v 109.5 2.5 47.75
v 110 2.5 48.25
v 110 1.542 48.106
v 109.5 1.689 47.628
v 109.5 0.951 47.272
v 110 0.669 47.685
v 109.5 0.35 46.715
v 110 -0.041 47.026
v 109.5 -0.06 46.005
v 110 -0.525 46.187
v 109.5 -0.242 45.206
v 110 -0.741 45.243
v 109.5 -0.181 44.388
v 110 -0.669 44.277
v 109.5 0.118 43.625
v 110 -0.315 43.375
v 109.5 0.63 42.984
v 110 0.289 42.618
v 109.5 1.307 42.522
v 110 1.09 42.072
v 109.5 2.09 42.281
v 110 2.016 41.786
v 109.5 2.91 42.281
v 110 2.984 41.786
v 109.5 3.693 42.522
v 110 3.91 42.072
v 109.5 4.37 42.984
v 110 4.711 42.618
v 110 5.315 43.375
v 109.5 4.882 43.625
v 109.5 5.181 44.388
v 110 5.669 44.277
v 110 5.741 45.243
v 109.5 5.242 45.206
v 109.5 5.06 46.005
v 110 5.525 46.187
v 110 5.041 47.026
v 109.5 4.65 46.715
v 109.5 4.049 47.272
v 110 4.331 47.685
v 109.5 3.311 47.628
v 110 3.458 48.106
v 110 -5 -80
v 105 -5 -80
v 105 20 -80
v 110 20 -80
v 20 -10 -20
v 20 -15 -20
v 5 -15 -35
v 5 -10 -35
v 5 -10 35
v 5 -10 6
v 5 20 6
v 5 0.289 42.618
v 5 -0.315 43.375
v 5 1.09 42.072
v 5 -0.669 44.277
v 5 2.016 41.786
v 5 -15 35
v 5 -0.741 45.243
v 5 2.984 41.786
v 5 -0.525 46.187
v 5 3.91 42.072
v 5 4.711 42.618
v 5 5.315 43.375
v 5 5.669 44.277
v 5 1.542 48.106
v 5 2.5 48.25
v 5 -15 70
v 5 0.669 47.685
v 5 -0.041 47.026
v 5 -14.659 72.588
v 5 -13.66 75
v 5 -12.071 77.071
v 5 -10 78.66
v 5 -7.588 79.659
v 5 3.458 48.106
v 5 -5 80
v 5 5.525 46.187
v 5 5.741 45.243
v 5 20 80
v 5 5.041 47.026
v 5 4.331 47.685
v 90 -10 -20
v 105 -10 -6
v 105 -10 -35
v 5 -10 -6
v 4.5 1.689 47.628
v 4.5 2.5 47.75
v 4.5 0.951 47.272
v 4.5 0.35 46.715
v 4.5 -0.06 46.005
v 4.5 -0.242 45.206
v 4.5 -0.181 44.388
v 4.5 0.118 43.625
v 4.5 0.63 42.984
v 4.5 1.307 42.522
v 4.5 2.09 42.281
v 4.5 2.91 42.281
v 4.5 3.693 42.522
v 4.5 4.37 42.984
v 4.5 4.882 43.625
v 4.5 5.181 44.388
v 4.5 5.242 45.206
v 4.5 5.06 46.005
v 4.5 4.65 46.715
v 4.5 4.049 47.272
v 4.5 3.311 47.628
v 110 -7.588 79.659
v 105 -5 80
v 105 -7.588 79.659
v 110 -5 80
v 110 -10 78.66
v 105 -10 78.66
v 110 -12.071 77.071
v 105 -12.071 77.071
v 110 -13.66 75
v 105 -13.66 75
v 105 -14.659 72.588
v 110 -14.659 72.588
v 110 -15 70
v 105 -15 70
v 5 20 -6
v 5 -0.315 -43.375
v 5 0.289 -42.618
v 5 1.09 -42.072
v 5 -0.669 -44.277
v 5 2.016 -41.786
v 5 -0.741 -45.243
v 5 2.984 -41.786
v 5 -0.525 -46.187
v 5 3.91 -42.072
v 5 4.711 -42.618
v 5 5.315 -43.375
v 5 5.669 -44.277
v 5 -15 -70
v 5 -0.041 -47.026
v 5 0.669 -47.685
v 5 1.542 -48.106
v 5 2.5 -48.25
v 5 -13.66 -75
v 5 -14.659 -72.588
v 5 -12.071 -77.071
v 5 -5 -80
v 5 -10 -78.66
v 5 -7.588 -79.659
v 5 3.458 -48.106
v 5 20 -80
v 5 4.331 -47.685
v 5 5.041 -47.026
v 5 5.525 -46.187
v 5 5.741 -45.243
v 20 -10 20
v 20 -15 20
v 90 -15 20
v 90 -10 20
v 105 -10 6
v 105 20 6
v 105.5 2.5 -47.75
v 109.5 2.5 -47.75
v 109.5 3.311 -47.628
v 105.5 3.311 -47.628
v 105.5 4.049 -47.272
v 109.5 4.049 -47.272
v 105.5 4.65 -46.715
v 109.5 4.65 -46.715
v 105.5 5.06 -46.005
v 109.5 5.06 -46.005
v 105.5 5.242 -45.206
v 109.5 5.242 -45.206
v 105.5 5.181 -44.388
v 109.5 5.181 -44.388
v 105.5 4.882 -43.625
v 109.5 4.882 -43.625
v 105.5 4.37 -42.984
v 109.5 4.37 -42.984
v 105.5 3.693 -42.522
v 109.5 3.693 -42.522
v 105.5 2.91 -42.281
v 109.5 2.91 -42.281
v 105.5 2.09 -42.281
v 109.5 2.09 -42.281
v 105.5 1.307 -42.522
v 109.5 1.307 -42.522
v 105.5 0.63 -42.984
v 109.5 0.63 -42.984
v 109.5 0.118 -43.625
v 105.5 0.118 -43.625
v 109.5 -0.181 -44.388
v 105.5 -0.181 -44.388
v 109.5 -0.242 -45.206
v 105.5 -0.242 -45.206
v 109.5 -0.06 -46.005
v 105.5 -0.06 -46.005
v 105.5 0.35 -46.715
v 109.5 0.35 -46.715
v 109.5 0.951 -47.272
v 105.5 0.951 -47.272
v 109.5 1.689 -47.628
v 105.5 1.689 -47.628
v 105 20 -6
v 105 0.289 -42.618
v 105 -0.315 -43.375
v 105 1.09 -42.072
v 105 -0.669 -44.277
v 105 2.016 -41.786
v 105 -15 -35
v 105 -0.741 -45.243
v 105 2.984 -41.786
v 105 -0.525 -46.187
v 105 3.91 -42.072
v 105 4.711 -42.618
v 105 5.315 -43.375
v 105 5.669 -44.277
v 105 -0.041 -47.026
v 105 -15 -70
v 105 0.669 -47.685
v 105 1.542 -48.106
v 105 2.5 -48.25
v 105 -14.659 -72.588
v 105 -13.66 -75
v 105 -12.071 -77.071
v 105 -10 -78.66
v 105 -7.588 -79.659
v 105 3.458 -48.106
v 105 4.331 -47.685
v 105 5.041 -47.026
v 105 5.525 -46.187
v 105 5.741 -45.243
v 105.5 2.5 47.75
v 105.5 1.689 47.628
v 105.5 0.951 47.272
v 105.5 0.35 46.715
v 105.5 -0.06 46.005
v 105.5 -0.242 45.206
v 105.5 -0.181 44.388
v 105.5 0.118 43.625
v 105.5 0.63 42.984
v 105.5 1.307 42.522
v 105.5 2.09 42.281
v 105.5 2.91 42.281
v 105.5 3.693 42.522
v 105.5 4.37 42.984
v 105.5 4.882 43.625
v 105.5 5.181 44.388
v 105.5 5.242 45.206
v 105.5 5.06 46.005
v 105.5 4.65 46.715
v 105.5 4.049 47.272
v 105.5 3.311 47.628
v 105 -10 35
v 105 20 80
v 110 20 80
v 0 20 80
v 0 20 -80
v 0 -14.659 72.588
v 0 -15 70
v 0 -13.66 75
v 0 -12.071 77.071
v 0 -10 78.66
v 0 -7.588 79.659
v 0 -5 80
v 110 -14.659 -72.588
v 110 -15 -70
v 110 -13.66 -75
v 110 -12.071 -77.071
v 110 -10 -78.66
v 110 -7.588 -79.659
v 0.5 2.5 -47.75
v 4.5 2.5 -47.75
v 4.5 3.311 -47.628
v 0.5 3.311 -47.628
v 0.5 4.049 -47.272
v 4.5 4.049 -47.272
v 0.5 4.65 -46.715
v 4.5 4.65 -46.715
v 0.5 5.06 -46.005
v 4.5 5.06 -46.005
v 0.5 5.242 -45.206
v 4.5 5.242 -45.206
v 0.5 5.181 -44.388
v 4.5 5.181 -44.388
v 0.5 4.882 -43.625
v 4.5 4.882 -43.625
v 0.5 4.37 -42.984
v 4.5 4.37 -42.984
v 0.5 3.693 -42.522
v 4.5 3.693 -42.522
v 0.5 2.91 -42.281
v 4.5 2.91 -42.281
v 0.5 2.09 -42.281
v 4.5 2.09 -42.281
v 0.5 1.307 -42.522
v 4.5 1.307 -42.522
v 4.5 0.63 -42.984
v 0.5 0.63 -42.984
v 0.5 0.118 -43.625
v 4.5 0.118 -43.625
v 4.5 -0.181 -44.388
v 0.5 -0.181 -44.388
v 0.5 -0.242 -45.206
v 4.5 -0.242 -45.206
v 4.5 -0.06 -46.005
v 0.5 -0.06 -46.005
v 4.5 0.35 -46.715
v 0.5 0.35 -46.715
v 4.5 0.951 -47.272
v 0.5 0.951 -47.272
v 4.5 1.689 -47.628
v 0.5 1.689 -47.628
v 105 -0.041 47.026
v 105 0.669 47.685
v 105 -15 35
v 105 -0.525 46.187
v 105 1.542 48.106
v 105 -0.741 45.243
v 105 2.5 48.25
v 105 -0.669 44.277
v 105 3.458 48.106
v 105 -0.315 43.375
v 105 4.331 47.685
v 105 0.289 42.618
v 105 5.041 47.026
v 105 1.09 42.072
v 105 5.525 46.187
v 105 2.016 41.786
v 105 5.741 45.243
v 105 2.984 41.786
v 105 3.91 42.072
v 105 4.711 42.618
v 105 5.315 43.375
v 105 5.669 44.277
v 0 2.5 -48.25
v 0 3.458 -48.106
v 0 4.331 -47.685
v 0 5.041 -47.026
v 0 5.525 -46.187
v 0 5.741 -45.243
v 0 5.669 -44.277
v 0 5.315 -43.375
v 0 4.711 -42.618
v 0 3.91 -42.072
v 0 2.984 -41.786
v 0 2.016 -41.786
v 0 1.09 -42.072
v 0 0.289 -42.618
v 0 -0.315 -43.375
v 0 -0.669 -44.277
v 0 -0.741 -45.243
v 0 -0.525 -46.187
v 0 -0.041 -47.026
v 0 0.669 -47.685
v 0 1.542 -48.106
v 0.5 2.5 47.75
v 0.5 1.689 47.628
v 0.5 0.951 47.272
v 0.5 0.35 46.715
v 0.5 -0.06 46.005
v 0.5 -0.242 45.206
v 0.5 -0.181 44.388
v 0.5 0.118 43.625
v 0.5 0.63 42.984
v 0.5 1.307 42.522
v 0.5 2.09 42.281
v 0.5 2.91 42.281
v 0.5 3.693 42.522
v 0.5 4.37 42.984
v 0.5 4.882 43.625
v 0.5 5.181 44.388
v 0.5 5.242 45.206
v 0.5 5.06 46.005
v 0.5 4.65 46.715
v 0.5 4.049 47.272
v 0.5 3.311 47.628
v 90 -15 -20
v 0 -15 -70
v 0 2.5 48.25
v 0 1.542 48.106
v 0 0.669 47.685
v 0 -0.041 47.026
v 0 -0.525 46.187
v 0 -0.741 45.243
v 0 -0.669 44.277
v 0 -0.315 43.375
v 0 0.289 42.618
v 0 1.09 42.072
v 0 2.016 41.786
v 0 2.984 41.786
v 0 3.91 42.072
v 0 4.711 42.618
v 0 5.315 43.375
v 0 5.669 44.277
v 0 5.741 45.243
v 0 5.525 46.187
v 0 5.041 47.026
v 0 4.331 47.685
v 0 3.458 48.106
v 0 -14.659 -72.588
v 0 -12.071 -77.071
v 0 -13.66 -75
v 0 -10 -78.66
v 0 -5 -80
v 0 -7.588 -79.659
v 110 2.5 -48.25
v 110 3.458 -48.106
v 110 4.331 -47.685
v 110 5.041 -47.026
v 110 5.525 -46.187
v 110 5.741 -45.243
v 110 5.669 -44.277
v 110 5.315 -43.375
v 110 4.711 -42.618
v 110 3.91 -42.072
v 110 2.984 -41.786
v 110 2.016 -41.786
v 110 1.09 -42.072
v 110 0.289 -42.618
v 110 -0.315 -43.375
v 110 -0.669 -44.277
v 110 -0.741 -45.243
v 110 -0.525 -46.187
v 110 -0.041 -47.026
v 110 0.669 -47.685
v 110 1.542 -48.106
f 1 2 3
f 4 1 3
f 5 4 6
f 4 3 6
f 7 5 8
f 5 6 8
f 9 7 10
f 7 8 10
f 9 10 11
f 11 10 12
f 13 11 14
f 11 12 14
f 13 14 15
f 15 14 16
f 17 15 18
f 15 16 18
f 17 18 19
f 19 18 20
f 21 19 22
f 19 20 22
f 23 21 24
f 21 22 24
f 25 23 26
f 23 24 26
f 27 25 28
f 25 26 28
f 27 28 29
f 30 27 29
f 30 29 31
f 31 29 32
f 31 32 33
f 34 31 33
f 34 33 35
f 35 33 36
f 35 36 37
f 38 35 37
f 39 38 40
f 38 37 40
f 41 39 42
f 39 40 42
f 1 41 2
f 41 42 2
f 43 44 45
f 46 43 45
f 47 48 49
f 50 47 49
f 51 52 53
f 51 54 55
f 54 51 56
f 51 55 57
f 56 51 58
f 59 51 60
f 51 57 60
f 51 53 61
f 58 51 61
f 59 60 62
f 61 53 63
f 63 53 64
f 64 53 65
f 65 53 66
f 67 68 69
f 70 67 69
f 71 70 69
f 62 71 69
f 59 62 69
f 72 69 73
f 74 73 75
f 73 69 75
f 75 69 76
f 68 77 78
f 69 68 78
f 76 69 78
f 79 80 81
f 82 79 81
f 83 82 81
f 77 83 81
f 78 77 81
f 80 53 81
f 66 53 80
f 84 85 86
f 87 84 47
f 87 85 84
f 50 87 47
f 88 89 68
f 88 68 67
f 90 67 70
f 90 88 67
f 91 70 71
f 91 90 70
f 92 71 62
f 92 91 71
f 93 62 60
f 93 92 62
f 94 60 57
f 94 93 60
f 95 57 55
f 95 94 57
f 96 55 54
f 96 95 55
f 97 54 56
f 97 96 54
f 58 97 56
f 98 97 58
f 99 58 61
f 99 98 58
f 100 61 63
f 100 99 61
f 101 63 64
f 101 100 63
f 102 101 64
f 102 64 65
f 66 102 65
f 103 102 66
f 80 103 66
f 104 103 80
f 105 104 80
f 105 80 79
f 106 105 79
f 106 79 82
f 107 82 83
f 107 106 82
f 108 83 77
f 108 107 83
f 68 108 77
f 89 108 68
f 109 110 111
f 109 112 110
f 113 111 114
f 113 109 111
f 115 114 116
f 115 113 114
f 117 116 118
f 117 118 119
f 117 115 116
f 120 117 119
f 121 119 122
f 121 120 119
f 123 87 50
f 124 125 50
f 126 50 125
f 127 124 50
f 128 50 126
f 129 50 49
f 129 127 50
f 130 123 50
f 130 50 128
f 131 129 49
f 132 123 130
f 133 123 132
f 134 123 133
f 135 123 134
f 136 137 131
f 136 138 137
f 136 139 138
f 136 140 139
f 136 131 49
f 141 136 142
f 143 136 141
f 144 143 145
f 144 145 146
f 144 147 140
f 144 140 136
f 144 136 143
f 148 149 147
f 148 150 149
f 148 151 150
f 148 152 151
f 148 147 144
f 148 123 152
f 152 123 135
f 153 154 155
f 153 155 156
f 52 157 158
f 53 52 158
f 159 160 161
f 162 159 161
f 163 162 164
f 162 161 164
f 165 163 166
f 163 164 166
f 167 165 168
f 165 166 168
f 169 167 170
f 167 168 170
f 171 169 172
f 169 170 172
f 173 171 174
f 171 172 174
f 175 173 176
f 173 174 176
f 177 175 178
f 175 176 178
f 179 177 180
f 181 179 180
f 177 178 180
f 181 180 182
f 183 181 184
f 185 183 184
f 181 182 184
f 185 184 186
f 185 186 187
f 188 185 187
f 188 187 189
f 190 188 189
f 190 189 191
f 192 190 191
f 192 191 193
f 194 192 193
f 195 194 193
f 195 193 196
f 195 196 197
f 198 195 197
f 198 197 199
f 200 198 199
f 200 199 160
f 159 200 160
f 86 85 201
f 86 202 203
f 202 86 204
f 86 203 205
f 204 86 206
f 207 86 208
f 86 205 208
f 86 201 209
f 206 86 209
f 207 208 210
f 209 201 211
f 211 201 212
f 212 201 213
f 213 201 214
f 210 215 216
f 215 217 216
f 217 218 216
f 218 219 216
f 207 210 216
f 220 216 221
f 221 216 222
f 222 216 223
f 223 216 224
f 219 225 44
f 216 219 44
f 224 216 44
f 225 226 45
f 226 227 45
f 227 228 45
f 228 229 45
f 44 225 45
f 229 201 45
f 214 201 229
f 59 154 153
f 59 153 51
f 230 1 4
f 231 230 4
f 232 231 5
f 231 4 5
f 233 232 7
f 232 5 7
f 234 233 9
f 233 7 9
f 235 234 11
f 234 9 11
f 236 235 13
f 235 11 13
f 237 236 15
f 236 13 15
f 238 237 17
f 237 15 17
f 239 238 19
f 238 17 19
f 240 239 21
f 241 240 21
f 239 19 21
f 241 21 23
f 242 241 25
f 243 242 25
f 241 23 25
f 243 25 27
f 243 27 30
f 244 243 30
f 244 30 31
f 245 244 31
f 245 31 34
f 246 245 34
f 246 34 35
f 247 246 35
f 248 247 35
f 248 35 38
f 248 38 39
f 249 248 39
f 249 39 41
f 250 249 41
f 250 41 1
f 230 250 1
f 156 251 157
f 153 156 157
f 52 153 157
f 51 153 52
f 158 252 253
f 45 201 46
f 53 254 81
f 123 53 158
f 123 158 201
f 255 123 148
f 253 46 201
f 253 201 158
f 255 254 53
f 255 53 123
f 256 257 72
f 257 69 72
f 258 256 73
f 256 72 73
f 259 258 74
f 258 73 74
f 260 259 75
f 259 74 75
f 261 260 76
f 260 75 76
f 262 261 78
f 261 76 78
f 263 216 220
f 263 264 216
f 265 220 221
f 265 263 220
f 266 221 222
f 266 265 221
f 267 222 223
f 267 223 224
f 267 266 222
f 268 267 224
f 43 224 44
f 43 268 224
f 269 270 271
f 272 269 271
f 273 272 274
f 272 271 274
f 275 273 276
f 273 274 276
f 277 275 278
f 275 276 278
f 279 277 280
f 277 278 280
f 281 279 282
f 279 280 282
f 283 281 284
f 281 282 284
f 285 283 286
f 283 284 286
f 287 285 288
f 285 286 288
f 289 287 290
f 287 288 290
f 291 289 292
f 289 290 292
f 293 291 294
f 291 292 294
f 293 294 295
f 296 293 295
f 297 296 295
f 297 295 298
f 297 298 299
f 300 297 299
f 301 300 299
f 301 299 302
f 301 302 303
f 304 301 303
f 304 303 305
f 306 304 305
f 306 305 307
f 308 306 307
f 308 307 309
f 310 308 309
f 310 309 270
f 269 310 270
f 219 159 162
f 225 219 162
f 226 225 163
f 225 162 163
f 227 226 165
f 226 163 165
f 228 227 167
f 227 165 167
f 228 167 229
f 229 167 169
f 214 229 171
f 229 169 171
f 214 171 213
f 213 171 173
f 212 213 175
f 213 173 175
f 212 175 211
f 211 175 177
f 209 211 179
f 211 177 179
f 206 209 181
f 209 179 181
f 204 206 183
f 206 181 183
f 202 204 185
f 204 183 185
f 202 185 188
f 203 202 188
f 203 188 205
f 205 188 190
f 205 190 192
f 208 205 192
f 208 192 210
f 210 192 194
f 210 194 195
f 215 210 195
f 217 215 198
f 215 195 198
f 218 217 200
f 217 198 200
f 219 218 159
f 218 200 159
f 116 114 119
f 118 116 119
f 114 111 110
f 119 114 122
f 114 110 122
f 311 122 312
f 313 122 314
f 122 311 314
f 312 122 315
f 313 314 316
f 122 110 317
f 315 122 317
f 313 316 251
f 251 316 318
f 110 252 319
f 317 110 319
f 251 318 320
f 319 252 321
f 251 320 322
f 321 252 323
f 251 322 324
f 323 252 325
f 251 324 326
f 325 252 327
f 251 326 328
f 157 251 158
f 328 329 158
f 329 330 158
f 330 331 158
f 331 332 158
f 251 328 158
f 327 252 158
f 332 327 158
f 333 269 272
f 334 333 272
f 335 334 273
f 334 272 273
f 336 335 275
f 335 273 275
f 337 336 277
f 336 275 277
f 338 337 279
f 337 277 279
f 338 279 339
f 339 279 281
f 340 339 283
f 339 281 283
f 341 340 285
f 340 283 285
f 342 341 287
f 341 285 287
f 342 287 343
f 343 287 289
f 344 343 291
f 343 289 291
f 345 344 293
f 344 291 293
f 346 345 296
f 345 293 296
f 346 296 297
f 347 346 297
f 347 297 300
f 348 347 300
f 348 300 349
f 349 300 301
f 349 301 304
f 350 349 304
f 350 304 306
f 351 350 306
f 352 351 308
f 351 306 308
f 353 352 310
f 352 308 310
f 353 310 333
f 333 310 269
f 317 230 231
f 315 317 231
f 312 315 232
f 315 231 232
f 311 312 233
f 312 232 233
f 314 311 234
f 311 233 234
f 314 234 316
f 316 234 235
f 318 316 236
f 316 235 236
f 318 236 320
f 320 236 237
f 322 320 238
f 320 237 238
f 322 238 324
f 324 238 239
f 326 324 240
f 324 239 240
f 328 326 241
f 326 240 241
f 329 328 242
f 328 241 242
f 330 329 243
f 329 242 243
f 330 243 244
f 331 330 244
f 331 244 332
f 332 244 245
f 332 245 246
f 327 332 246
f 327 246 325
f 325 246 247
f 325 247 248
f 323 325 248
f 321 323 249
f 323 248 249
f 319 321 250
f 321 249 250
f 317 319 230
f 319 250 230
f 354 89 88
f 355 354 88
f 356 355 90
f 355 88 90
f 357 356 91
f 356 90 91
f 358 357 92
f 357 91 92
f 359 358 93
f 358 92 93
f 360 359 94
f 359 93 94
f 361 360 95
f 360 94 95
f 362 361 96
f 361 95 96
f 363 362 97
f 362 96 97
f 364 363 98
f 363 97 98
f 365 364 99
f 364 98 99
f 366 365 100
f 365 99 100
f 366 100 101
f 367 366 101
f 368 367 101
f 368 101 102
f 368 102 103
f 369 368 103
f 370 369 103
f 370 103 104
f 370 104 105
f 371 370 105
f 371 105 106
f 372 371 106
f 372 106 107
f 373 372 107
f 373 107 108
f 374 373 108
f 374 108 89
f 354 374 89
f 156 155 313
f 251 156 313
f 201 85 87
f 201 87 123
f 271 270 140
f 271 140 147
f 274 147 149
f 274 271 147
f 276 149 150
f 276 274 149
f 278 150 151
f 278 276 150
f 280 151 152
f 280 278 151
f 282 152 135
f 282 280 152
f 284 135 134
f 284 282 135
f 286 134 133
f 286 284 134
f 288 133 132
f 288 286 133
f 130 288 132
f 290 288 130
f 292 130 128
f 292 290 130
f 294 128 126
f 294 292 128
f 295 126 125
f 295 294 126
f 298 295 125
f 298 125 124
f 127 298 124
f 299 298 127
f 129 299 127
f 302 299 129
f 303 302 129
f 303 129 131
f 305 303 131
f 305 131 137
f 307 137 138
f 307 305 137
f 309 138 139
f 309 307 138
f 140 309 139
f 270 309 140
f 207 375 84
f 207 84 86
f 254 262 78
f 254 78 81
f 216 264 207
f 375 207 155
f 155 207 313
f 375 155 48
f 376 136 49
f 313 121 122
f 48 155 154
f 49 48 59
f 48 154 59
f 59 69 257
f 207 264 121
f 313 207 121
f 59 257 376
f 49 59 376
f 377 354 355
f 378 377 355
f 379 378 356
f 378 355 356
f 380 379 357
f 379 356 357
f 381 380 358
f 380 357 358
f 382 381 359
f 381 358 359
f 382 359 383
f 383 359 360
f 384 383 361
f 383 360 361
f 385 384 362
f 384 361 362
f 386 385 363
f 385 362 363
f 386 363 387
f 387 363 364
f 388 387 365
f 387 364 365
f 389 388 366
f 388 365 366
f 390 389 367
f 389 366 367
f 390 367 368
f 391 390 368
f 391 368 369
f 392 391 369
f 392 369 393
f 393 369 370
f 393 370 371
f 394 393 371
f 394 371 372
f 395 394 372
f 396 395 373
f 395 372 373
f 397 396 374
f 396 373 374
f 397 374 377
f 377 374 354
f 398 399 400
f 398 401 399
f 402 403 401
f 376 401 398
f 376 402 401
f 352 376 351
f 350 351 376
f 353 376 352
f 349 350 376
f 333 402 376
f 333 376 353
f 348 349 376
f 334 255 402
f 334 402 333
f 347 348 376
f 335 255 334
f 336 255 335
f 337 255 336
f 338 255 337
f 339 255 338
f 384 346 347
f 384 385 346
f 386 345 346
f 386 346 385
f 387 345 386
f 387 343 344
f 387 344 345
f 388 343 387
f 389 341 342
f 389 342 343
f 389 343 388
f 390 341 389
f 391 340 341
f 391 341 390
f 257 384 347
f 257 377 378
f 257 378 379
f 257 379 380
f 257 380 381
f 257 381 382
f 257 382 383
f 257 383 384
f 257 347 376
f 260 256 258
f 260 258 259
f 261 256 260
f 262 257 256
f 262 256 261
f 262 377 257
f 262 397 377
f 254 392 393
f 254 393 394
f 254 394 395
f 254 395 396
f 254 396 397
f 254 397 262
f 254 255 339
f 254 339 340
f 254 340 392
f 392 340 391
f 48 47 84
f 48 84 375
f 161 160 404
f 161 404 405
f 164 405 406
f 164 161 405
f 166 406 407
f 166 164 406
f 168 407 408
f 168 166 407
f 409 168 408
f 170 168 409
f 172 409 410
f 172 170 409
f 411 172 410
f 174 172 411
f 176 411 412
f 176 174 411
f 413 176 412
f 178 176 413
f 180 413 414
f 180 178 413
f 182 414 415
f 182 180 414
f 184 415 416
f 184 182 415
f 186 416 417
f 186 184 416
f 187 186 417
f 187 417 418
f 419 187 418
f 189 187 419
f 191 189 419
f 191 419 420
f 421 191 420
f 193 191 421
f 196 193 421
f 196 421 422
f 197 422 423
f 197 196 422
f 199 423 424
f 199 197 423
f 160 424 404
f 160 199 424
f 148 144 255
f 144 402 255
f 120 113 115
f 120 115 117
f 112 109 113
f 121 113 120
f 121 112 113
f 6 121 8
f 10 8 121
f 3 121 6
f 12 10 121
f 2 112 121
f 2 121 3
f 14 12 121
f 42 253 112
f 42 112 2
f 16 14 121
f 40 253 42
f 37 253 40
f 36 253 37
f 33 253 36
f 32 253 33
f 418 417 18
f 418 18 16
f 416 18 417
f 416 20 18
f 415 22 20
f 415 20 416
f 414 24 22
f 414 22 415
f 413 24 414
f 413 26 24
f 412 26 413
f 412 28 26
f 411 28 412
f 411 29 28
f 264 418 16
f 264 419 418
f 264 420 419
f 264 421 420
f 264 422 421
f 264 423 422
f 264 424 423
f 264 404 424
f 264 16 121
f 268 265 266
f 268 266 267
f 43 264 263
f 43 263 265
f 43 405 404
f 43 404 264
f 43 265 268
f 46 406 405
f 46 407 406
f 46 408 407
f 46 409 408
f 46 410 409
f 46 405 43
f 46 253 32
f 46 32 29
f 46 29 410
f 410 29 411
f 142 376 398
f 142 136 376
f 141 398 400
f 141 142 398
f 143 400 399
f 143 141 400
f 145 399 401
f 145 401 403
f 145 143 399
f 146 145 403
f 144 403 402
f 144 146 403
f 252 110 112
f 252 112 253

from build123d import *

# Parameters (mm, degrees)
SKETCH_1_W          = 160
SKETCH_1_H          = 20
EXTRUDE_1_DEPTH     = 5
EXTRUDE_3_DEPTH     = 100
SKETCH_5_W          = 12
SKETCH_5_H          = 15
EXTRUDE_4_DEPTH     = 105
SKETCH_6_W          = 74
SKETCH_6_H          = 15
EXTRUDE_5_DEPTH     = 5
SKETCH_7_W          = 160
SKETCH_7_H          = 35
EXTRUDE_6_DEPTH     = 5
EXTRUDE_7_DEPTH     = 5
SKETCH_9_R          = 2.75
CUT_EXTRUDE_1_DEPTH = 138.477270849
CHAMFER_1_SIZE      = 0.5
FILLET_1_R          = 10


with BuildPart() as part:
    # 草图1 → 凸台-拉伸1 (new body)
    with BuildSketch(Plane(origin=(0, 0, 0), x_dir=(0, 0, -1), z_dir=(1, 0, 0))):
        with Locations((0, -5)):
            Rectangle(SKETCH_1_W, SKETCH_1_H)
    extrude(amount=EXTRUDE_1_DEPTH)

    # 草图3 → 凸台-拉伸3 (add)
    with BuildSketch(Plane(origin=(5, 0, 0), x_dir=(0, 0, -1), z_dir=(1, 0, 0))):
        Polygon((-6, 5), (6, 5), (6, -10), (20, -10), (20, -15), (-20, -15), (-20, -10), (-6, -10), align=None)
    extrude(amount=EXTRUDE_3_DEPTH)

    # 草图5 → 凸台-拉伸4 (add)
    with BuildSketch(Plane.ZY):
        with Locations((0, 12.5)):
            Rectangle(SKETCH_5_W, SKETCH_5_H)
    extrude(amount=-EXTRUDE_4_DEPTH)

    # 草图6 → 凸台-拉伸5 (add)
    with BuildSketch(Plane.ZY):
        with Locations((43, 12.5)):
            Rectangle(SKETCH_6_W, SKETCH_6_H)
        with Locations((-43, 12.5)):
            Rectangle(SKETCH_6_W, SKETCH_6_H)
    extrude(amount=-EXTRUDE_5_DEPTH)

    # 草图7 → 凸台-拉伸6 (add)
    with BuildSketch(Plane(origin=(105, 0, 0), x_dir=(0, 0, -1), z_dir=(1, 0, 0))):
        with Locations((0, 2.5)):
            Rectangle(SKETCH_7_W, SKETCH_7_H)
    extrude(amount=EXTRUDE_6_DEPTH)

    # 草图8 → 凸台-拉伸7 (add)
    with BuildSketch(Plane.XZ.offset(15)):
        Polygon((90, 20), (105, 35), (105, 20), align=None)
        Polygon((105, -20), (90, -20), (105, -35), align=None)
        Polygon((5, 20), (20, 20), (5, 35), align=None)
        Polygon((20, -20), (5, -35), (5, -20), align=None)
    extrude(amount=-EXTRUDE_7_DEPTH)

    # 草图9 → 切除-拉伸1 (cut, through all)
    with BuildSketch(Plane(origin=(110, 0, 0), x_dir=(0, 0, -1), z_dir=(1, 0, 0))):
        with Locations((45, 2.5)):
            Circle(SKETCH_9_R)
        with Locations(Location((-45, 2.5, 0), (0, 0, 180))):
            Circle(SKETCH_9_R)
    extrude(amount=-CUT_EXTRUDE_1_DEPTH, mode=Mode.SUBTRACT)

    # 倒角1
    chamfer_1_edges = [part.edges().sort_by_distance(p)[0] for p in [
        (105, 2.5, -42.25),
        (5, 2.5, -42.25),
        (0, 2.5, -42.25),
        (110, 2.5, -42.25),
        (105, 2.5, 42.25),
        (5, 2.5, 42.25),
        (0, 2.5, 42.25),
        (110, 2.5, 42.25),
    ]]
    chamfer(chamfer_1_edges, length=CHAMFER_1_SIZE)

    # 圆角1
    fillet_1_edges = [part.edges().sort_by_distance(p)[0] for p in [
        (107.5, -15, 80),
        (107.5, -15, -80),
        (2.5, -15, -80),
        (2.5, -15, 80),
    ]]
    fillet(fillet_1_edges, radius=FILLET_1_R)


solid = part.part
